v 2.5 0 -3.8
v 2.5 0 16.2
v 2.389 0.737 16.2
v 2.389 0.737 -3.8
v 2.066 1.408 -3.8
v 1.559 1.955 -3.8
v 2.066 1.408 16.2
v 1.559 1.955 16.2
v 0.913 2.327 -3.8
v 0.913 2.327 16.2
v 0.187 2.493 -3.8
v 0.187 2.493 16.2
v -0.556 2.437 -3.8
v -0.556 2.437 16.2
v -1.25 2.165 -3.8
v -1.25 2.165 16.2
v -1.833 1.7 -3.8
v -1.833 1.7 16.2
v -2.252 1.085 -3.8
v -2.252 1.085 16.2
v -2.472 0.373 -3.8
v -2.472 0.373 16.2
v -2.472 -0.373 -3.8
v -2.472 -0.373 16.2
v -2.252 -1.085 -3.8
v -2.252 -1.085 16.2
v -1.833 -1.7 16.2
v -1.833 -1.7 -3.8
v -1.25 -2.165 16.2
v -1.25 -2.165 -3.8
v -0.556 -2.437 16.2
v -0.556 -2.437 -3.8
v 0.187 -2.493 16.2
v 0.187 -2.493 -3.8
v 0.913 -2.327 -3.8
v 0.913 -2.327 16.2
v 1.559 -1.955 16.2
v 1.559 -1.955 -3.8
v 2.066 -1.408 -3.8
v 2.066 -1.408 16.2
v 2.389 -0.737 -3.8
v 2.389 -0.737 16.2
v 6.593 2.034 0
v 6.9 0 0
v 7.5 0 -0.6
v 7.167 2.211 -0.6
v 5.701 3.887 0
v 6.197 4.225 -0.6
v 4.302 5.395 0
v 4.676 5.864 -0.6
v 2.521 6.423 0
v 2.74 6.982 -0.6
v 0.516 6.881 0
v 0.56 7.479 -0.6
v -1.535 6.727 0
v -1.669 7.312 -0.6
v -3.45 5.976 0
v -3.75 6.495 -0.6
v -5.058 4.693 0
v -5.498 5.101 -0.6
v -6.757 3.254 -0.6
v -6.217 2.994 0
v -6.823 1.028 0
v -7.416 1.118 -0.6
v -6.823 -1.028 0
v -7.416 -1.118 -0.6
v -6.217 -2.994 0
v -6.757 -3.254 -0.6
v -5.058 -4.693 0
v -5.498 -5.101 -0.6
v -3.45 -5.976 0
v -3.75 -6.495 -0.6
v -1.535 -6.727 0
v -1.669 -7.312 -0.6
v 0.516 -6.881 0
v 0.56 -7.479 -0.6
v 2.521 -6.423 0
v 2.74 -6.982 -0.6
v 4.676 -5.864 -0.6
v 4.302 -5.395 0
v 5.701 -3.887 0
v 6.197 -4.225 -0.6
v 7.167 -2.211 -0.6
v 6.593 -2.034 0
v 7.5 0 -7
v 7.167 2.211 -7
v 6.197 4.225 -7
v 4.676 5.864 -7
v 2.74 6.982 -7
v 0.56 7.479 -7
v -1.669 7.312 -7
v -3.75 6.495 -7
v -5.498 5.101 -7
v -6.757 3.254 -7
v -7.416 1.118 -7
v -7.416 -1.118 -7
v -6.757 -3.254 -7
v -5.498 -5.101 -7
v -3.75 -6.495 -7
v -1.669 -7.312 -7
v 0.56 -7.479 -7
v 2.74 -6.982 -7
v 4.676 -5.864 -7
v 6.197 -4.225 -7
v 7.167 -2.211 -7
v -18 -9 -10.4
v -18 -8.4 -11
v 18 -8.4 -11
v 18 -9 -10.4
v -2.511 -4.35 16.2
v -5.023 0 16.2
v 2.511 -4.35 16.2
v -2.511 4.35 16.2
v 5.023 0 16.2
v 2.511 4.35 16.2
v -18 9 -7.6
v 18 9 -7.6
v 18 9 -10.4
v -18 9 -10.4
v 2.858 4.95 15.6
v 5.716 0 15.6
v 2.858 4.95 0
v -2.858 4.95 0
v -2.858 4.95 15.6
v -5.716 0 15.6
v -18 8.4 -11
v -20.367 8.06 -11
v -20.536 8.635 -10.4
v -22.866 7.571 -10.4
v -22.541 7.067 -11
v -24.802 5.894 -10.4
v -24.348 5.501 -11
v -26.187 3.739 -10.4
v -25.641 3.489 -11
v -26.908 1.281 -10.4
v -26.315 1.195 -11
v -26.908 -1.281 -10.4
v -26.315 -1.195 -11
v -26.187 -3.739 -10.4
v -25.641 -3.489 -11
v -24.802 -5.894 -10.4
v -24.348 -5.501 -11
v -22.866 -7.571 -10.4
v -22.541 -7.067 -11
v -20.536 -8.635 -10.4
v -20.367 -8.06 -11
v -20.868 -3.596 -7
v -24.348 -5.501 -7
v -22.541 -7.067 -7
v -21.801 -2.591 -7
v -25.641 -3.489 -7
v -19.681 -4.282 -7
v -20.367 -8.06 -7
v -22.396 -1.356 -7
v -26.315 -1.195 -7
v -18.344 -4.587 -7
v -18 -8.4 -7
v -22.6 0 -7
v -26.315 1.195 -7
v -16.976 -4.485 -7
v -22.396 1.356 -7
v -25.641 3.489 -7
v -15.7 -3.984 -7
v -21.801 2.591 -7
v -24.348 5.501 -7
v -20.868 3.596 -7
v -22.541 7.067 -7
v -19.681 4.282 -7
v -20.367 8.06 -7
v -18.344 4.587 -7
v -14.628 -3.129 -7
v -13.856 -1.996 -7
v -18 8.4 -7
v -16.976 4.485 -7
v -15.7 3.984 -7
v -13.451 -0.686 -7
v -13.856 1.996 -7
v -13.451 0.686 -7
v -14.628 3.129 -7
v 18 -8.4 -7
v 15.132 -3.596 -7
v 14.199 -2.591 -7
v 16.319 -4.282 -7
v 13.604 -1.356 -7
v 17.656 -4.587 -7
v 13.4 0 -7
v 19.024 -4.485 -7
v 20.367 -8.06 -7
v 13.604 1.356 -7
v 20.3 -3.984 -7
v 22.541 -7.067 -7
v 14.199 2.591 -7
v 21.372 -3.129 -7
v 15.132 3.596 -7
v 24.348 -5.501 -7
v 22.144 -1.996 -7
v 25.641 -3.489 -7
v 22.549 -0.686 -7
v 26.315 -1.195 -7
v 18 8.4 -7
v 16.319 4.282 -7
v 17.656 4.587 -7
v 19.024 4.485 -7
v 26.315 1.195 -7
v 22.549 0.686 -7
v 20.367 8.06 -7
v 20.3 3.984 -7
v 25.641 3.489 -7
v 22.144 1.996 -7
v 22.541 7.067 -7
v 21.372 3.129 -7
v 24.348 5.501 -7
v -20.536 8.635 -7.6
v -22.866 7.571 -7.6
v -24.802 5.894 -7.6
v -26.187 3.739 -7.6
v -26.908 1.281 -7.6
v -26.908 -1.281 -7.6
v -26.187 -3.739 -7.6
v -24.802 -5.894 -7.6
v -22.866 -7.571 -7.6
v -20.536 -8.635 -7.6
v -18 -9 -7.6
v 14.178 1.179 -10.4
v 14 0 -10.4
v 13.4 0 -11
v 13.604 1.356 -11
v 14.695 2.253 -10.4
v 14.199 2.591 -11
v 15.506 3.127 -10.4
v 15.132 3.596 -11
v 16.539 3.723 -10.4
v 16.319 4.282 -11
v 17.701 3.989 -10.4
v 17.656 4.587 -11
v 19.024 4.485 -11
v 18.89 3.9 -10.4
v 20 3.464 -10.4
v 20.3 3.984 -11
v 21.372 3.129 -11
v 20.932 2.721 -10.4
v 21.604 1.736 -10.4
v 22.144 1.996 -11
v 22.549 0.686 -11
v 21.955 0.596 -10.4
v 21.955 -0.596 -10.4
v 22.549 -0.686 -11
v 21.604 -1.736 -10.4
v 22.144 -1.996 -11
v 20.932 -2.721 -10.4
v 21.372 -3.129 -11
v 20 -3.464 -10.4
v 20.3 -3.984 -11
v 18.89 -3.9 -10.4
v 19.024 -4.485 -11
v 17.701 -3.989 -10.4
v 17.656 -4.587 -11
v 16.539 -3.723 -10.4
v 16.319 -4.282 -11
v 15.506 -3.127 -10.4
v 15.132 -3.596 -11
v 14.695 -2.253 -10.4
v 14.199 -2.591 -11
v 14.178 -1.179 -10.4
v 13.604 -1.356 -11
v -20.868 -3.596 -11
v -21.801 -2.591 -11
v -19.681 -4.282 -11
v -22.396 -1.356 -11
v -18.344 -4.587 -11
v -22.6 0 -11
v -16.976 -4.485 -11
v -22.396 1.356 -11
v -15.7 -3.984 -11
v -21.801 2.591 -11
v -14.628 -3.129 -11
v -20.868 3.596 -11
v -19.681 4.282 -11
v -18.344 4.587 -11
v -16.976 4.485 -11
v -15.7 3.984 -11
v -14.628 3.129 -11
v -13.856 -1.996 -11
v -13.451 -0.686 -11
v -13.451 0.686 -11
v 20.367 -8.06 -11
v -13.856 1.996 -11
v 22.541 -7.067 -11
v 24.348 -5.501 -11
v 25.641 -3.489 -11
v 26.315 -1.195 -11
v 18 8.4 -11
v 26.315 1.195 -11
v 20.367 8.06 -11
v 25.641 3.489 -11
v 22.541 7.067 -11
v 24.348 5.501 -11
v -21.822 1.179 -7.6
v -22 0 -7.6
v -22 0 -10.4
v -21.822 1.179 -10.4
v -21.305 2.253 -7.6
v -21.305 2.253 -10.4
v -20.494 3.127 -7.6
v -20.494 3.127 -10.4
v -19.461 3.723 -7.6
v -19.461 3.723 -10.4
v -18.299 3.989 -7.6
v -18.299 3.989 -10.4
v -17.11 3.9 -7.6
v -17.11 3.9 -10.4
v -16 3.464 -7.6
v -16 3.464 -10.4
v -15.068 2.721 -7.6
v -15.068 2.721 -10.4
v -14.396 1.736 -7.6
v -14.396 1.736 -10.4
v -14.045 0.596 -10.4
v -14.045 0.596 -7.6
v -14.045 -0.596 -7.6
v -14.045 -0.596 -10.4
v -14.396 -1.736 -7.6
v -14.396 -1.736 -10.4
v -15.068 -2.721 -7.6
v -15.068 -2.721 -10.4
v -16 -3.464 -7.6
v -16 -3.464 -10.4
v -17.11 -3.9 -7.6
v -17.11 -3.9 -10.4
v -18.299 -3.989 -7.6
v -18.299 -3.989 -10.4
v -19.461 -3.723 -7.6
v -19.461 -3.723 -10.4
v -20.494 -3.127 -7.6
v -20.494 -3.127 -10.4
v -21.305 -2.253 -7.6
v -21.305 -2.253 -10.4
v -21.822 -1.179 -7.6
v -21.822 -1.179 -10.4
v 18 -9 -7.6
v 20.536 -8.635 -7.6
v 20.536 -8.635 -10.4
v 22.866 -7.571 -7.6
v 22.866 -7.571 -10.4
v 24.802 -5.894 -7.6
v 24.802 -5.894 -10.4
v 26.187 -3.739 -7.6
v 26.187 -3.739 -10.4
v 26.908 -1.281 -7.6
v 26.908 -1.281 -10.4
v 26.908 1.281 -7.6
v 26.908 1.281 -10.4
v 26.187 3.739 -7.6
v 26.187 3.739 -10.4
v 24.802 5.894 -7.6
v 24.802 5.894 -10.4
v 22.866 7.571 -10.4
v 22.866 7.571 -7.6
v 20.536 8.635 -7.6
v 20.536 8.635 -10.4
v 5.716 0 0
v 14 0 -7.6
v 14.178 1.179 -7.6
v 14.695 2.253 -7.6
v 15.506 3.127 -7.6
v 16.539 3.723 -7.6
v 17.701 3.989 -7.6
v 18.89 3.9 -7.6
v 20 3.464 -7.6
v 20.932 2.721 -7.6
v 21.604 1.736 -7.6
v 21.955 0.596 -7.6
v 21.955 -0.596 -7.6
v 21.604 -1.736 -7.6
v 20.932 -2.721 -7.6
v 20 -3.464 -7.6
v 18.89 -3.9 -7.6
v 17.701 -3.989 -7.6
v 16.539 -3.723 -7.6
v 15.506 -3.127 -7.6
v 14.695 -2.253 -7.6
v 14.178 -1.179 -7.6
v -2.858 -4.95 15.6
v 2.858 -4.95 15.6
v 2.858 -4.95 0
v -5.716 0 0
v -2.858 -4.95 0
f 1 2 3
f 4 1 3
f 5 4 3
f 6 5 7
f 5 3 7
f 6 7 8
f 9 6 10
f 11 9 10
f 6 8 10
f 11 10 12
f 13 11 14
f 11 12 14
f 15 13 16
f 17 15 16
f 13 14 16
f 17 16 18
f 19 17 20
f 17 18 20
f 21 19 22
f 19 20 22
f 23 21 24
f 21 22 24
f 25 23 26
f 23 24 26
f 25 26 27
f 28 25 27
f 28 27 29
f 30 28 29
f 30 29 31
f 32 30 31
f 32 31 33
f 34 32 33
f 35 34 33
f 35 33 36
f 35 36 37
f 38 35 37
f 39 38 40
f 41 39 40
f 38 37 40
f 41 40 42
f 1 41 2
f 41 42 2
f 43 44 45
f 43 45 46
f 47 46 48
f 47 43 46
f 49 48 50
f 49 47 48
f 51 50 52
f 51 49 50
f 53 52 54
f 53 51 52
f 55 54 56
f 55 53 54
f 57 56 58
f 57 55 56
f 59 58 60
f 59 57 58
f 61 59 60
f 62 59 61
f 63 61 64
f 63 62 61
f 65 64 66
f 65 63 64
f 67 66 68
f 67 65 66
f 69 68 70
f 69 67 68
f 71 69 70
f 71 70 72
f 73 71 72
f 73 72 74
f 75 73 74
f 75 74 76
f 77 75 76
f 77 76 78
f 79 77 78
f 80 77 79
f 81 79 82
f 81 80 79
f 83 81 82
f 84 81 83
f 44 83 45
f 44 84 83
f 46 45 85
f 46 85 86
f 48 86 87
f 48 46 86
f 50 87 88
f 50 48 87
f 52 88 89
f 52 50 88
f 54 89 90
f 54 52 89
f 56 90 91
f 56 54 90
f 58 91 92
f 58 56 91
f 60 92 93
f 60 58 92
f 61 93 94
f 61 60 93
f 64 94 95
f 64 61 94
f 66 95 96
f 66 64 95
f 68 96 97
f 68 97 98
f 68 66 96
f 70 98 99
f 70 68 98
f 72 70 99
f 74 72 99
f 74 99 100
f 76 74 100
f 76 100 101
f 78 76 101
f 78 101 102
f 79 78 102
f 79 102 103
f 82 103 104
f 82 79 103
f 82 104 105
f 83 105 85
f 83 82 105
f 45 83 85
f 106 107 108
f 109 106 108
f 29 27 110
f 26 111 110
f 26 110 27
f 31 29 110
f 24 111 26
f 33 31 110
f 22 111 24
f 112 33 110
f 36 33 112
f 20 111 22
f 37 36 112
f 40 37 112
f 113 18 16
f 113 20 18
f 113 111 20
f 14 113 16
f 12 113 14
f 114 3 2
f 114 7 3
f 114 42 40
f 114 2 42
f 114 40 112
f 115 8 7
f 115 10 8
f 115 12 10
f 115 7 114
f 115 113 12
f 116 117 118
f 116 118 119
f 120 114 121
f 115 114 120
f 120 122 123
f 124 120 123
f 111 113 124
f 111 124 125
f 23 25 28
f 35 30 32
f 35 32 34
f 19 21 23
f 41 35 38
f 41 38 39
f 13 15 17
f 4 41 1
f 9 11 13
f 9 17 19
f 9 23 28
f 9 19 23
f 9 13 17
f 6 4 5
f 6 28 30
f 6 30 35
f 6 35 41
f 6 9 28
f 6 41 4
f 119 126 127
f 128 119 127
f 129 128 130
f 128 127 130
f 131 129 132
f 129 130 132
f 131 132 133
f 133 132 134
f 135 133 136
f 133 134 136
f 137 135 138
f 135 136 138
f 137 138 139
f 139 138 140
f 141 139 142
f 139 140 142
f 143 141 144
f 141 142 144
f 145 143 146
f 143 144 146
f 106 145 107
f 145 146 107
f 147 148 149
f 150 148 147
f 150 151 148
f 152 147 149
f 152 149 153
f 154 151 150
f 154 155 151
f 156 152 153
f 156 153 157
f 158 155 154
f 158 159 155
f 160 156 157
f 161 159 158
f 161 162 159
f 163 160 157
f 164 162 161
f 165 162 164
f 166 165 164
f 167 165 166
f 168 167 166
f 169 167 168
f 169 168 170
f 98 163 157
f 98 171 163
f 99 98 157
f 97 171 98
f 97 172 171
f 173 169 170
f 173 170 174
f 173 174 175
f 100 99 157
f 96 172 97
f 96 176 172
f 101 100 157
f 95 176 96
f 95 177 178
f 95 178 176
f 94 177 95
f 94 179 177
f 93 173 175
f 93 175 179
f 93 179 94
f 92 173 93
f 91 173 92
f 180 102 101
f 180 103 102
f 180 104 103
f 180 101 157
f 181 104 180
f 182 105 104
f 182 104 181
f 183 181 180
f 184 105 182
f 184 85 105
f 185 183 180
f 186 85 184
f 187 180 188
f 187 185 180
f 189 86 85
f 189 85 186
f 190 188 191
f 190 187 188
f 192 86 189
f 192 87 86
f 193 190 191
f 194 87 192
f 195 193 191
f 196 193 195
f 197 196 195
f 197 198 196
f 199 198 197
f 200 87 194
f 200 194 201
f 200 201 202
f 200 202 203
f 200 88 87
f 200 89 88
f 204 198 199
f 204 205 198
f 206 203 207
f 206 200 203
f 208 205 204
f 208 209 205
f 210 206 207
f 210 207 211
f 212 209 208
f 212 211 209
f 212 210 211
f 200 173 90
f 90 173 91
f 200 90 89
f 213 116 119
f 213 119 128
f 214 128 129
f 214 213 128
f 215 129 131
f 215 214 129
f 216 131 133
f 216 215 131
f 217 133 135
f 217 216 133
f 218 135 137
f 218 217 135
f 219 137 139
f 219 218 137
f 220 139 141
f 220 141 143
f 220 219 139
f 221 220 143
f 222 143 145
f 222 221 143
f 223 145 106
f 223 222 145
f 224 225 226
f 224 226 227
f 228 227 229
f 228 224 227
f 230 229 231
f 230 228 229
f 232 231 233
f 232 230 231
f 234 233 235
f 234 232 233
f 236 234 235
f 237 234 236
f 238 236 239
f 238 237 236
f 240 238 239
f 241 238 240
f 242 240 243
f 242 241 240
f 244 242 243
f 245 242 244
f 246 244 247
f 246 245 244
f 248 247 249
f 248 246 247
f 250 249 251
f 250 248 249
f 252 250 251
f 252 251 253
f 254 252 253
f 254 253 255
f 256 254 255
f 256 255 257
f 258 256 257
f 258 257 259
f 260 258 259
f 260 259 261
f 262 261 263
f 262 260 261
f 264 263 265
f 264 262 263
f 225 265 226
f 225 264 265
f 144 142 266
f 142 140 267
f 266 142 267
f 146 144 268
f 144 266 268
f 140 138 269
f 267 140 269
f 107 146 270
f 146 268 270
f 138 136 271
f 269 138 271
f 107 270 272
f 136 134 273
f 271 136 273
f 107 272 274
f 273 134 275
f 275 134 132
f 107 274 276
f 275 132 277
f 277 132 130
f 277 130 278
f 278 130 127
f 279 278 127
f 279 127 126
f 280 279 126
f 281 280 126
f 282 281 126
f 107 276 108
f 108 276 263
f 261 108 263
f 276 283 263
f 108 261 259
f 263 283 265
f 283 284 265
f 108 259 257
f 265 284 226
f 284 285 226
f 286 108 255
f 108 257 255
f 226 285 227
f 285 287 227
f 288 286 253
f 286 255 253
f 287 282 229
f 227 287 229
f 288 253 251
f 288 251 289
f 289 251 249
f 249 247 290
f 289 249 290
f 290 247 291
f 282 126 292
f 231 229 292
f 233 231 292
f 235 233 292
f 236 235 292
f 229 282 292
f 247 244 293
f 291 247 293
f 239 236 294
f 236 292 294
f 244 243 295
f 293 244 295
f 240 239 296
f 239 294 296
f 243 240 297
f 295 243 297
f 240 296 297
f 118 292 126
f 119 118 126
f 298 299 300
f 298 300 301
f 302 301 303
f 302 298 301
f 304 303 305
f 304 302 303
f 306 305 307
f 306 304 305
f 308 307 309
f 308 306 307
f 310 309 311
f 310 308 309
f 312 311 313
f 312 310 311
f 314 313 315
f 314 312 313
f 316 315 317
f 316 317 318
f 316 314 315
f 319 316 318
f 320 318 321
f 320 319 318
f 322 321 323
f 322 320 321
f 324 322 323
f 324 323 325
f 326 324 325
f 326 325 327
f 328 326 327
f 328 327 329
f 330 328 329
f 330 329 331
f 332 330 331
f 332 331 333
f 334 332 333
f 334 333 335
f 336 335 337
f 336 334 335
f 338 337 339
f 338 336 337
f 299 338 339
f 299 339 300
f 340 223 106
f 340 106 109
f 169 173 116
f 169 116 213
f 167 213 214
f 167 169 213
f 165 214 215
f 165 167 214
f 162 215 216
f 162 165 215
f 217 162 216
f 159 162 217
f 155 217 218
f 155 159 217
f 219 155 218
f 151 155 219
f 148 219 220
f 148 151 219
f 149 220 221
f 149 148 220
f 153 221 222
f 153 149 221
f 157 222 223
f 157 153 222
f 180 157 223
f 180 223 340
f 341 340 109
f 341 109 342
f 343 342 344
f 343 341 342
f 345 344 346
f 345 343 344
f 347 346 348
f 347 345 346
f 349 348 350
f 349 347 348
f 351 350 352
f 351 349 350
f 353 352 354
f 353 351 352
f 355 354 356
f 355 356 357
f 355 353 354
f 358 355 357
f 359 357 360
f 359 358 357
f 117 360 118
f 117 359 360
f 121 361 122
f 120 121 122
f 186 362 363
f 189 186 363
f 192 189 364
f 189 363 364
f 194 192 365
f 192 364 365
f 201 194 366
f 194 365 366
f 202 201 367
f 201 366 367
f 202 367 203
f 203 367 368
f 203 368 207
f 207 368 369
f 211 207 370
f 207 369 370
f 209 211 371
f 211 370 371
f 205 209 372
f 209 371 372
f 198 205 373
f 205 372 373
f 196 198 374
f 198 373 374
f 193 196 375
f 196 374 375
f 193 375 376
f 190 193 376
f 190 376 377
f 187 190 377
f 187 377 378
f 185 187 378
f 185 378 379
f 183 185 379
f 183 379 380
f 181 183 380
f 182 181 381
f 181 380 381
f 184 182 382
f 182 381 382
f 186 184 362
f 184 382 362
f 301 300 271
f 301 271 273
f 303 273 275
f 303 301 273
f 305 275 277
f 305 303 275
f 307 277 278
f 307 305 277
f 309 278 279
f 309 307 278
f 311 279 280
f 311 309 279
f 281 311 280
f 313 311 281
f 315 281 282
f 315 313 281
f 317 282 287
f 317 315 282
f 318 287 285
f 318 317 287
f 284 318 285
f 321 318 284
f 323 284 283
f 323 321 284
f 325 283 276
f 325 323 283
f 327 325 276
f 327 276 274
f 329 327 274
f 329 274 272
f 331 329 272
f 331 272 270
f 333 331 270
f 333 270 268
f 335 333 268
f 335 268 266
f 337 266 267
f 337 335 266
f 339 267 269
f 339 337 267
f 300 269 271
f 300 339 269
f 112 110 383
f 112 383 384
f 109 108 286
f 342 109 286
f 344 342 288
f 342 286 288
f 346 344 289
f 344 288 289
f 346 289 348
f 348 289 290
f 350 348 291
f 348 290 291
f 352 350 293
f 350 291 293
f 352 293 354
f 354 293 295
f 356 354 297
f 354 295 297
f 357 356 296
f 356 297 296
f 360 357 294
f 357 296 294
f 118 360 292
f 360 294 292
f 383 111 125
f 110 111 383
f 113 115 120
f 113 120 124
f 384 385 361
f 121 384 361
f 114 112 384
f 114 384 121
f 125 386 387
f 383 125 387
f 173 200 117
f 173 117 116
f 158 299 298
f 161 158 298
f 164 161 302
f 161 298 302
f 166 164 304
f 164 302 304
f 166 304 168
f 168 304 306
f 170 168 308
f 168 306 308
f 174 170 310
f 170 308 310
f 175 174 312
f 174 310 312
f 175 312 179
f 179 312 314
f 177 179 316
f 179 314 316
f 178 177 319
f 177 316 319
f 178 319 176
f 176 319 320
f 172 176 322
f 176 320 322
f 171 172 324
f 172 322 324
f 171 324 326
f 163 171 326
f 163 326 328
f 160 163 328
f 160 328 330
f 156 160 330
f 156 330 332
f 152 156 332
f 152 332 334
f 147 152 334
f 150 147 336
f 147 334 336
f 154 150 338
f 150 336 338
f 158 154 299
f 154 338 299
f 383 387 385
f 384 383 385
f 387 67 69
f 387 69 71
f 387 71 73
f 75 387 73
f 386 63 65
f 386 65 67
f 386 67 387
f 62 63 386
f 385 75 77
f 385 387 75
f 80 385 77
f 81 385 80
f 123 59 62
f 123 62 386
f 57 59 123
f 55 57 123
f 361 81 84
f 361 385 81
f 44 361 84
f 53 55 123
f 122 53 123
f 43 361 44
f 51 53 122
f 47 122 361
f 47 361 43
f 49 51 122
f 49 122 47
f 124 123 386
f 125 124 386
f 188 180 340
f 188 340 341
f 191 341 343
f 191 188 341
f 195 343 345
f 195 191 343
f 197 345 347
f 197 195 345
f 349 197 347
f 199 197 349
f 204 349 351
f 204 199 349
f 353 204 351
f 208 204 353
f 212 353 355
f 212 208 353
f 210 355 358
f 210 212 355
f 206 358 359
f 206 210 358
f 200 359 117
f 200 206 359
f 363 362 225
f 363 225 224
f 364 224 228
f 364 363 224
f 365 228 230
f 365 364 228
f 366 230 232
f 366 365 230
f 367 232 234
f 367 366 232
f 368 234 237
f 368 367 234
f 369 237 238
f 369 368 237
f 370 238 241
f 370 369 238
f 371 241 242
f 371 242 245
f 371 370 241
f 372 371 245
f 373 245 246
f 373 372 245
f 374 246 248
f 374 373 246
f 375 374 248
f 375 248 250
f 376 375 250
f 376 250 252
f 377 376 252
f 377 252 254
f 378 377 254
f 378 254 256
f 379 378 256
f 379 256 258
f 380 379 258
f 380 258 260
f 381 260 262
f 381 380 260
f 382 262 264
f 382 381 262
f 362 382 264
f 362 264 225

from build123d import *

# Parameters (mm, degrees)
BOSS_EXTRUDE1_DEPTH = 16.2
SKETCH2_R           = 7.5
BOSS_EXTRUDE2_DEPTH = 7
SKETCH3_R           = 4
BOSS_EXTRUDE3_DEPTH = 4
CHAMFER1_SIZE       = 0.6
SKETCH4_R           = 2.5
CUT_EXTRUDE1_DEPTH  = 20


with BuildPart() as part:
    # Sketch1 → Boss-Extrude1 (new body)
    with BuildSketch(Plane.XY):
        Polygon((2.857883832, -4.95), (5.715767665, 0), (2.857883832, 4.95), (-2.857883832, 4.95), (-5.715767665, 0), (-2.857883832, -4.95), align=None)
    extrude(amount=BOSS_EXTRUDE1_DEPTH)

    # Sketch2 → Boss-Extrude2 (add)
    with BuildSketch(Plane.XY):
        Circle(SKETCH2_R)
    extrude(amount=-BOSS_EXTRUDE2_DEPTH)

    # Sketch3 → Boss-Extrude3 (add)
    with BuildSketch(Plane(origin=(0, 0, -7), x_dir=(-1, 0, 0), z_dir=(0, 0, -1))):
        with BuildLine():
            Line((-18, 9), (18, 9))
            ThreePointArc((18, 9), (27, 0), (18, -9))
            Line((18, -9), (-18, -9))
            ThreePointArc((-18, -9), (-27, 0), (-18, 9))
        make_face()
        with Locations((-18, 0)):
            Circle(SKETCH3_R, mode=Mode.SUBTRACT)
        with Locations((18, 0)):
            Circle(SKETCH3_R, mode=Mode.SUBTRACT)
    extrude(amount=BOSS_EXTRUDE3_DEPTH)

    # Chamfer1
    chamfer1_edges = [part.edges().sort_by_distance(p)[0] for p in [
        (4.286825749, 2.475, 16.2),
        (0, 4.95, 16.2),
        (-7.5, 0, 0),
        (-4.286825749, 2.475, 16.2),
        (-4.286825749, -2.475, 16.2),
        (27, 0, -11),
        (0, -9, -11),
        (-27, 0, -11),
        (0, 9, -11),
        (22, 0, -7),
        (-14, 0, -7),
        (27, 0, -7),
        (0, -9, -7),
        (-27, 0, -7),
        (0, 9, -7),
        (22, 0, -11),
        (-14, 0, -11),
        (0, -4.95, 16.2),
        (4.286825749, -2.475, 16.2),
    ]]
    chamfer(chamfer1_edges, length=CHAMFER1_SIZE)

    # Sketch4 → Cut-Extrude1 (cut)
    with BuildSketch(Plane.XY.offset(16.2)):
        Circle(SKETCH4_R)
    extrude(amount=-CUT_EXTRUDE1_DEPTH, mode=Mode.SUBTRACT)


solid = part.part
